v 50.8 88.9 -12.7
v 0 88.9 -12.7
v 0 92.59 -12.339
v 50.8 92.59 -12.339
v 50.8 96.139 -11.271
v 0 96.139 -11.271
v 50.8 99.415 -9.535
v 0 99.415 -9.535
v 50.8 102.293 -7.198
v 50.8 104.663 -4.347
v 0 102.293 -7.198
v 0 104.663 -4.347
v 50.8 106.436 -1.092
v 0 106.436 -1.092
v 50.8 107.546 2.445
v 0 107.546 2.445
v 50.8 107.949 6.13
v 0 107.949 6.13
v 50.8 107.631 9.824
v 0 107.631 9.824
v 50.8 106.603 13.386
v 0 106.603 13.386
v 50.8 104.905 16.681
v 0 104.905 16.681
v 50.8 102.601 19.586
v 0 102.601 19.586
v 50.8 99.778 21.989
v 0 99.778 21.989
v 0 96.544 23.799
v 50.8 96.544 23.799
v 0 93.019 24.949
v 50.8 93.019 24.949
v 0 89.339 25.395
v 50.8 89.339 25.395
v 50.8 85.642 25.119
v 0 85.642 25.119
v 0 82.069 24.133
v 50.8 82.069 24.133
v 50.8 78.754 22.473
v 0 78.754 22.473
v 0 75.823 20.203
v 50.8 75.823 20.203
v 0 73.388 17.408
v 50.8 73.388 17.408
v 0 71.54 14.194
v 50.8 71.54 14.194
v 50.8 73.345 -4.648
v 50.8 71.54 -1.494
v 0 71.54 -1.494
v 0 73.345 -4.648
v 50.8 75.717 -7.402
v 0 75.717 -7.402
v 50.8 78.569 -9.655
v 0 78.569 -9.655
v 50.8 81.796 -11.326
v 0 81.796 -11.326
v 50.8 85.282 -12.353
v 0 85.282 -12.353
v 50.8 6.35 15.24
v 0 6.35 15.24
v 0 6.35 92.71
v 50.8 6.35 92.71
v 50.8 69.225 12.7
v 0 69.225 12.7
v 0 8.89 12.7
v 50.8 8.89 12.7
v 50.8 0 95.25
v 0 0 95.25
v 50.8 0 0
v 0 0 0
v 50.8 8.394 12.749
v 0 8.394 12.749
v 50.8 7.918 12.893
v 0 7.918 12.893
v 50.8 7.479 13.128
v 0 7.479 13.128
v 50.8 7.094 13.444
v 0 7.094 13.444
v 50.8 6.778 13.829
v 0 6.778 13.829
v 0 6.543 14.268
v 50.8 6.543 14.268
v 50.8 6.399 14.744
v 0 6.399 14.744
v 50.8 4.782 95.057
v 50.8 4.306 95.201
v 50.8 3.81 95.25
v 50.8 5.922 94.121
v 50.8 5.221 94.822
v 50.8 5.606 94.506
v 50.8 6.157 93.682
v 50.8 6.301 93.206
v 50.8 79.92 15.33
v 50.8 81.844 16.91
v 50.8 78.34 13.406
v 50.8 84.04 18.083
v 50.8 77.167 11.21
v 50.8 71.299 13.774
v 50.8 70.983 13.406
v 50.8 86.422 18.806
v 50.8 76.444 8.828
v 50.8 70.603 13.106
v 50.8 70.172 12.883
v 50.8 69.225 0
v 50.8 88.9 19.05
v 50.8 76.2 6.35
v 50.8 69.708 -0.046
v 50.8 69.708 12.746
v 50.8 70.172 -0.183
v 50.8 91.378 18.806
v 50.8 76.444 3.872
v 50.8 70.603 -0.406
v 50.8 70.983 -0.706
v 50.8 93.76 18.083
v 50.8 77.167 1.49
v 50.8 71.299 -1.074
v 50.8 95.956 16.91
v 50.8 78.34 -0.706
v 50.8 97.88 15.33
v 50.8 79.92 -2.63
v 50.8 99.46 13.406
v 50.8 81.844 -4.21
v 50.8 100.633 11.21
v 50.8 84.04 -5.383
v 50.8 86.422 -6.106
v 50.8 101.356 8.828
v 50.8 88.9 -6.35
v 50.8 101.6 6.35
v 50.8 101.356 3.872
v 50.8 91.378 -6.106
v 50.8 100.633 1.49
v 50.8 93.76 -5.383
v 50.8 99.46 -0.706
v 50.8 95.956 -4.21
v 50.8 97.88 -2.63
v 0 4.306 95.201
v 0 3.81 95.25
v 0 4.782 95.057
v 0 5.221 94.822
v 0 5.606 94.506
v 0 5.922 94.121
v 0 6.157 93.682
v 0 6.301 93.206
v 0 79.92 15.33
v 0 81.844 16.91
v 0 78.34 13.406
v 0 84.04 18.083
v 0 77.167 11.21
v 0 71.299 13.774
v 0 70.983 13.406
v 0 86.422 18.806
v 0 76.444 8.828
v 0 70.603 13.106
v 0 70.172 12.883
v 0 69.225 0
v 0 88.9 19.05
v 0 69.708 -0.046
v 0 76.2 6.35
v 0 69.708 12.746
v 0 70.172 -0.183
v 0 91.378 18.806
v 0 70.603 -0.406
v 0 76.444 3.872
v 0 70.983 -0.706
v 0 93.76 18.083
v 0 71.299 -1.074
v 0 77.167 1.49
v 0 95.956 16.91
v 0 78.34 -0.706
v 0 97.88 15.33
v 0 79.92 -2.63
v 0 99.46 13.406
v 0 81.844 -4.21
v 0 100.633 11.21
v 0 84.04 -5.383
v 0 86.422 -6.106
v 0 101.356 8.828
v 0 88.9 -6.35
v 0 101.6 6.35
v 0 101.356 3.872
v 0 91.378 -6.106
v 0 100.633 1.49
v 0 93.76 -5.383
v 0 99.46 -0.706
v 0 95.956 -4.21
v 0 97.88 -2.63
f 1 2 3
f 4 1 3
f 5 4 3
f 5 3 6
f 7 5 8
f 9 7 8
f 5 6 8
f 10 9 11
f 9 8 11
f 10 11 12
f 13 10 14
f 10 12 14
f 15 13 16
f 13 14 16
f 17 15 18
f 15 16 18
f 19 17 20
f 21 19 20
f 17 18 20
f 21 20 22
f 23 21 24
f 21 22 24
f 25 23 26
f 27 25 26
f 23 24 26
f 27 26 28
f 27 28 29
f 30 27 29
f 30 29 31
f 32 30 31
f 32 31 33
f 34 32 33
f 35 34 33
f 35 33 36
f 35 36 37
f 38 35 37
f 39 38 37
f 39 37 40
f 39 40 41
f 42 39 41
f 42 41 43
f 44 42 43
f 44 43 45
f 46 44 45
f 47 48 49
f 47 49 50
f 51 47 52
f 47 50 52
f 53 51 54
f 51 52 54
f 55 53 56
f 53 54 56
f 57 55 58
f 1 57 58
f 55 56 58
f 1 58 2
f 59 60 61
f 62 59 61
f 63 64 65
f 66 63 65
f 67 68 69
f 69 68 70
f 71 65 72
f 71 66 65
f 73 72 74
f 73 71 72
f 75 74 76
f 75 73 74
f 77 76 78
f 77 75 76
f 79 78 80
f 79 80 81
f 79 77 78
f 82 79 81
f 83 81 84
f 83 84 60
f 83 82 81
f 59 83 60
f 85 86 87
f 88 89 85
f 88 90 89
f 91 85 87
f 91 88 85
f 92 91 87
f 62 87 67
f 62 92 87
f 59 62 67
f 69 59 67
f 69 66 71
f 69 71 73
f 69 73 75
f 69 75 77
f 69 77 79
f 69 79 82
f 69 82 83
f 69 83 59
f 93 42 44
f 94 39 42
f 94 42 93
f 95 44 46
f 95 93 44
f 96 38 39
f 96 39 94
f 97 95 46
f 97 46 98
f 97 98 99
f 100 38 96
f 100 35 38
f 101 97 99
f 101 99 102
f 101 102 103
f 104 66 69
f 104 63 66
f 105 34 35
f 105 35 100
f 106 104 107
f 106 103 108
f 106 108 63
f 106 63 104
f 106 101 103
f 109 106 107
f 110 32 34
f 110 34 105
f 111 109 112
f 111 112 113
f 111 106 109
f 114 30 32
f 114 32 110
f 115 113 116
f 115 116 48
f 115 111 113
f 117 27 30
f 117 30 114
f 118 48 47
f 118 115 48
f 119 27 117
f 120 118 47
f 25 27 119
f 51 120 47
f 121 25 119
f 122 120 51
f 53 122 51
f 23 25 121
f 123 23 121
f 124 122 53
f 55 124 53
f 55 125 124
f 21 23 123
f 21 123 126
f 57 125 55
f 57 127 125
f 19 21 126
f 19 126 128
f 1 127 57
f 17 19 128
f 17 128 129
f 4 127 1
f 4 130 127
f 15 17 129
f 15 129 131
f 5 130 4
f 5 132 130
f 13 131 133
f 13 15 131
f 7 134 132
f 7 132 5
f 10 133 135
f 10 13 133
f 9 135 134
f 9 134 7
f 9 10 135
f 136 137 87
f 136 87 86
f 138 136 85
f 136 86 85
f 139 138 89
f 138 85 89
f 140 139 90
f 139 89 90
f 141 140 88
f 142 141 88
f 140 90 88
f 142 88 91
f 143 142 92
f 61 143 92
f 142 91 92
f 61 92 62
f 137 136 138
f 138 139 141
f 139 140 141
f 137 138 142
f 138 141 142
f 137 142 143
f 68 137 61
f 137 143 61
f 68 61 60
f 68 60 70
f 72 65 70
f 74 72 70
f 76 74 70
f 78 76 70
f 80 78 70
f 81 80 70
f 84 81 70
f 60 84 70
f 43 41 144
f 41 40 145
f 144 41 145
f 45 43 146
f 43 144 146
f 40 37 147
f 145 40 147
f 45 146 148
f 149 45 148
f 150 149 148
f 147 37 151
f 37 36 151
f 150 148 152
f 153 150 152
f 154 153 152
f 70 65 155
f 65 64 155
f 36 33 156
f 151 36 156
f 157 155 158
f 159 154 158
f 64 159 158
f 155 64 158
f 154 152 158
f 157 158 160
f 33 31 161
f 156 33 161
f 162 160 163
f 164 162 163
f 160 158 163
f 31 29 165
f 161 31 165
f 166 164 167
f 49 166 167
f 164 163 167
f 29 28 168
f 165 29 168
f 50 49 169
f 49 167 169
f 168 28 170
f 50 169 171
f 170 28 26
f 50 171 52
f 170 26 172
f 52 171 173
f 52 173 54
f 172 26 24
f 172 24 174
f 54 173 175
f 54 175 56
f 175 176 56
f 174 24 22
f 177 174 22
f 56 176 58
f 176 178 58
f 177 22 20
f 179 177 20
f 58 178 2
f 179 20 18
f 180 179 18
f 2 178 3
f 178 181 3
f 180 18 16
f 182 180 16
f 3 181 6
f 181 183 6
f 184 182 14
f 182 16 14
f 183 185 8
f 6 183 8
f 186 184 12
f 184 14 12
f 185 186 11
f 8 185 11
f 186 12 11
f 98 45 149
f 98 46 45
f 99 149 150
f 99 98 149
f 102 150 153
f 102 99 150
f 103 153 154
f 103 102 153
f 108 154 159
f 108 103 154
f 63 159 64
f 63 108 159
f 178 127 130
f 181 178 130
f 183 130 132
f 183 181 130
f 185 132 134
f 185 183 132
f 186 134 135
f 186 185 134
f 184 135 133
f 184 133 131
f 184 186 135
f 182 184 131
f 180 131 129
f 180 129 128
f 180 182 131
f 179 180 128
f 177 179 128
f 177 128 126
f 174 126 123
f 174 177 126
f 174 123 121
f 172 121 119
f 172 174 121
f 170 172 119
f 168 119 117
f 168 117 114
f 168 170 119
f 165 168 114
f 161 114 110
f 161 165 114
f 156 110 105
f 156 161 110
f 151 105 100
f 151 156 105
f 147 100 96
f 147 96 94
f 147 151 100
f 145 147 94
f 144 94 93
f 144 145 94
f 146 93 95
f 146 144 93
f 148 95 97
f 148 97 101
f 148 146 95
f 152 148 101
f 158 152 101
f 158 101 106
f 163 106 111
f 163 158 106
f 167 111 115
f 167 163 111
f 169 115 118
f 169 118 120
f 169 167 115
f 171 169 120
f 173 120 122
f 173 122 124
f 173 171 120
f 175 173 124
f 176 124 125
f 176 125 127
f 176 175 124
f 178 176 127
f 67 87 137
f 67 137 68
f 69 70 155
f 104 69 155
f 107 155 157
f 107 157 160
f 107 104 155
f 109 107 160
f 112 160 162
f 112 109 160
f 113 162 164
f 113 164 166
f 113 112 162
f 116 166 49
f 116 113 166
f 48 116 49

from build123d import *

# Parameters (mm, degrees)
SKETCH1_R           = 12.7
BOSS_EXTRUDE1_DEPTH = 50.8
FILLET1_R           = 2.54
FILLET2_R           = 2.54


with BuildPart() as part:
    # Sketch1 → Boss-Extrude1 (new body)
    with BuildSketch(Plane(origin=(0, 0, 0), x_dir=(0, 0, -1), z_dir=(1, 0, 0))):
        with BuildLine():
            Line((-95.25, 0), (0, 0))
            Line((0, 0), (0, 70.939487758))
            ThreePointArc((0, 70.939487758), (-6.35, 69.85), (-12.7, 70.939487758))
            Line((-12.7, 70.939487758), (-12.7, 6.35))
            Line((-12.7, 6.35), (-95.25, 6.35))
            Line((-95.25, 6.35), (-95.25, 0))
        make_face()
        with BuildLine():
            Line((-12.7, 70.939487758), (0, 70.939487758))
            ThreePointArc((0, 70.939487758), (9.204259867, 77.901477372), (12.7, 88.9))
            ThreePointArc((12.7, 88.9), (-17.348522628, 104.454259867), (-12.7, 70.939487758))
        make_face()
        with Locations((-6.35, 88.9)):
            Circle(SKETCH1_R, mode=Mode.SUBTRACT)
        with BuildLine():
            ThreePointArc((-12.7, 70.939487758), (-6.35, 69.85), (0, 70.939487758))
            Line((0, 70.939487758), (-12.7, 70.939487758))
        make_face()
    extrude(amount=BOSS_EXTRUDE1_DEPTH)

    # Fillet1
    fillet1_edges = [part.edges().sort_by_distance(p)[0] for p in [
        (25.4, 6.35, 12.7),
        (25.4, 70.939487758, 12.7),
        (25.4, 70.939487758, 0),
    ]]
    fillet(fillet1_edges, radius=FILLET1_R)

    # Fillet2
    fillet2_edges = [part.edges().sort_by_distance(p)[0] for p in [
        (25.4, 6.35, 95.25),
    ]]
    fillet(fillet2_edges, radius=FILLET2_R)


solid = part.part
